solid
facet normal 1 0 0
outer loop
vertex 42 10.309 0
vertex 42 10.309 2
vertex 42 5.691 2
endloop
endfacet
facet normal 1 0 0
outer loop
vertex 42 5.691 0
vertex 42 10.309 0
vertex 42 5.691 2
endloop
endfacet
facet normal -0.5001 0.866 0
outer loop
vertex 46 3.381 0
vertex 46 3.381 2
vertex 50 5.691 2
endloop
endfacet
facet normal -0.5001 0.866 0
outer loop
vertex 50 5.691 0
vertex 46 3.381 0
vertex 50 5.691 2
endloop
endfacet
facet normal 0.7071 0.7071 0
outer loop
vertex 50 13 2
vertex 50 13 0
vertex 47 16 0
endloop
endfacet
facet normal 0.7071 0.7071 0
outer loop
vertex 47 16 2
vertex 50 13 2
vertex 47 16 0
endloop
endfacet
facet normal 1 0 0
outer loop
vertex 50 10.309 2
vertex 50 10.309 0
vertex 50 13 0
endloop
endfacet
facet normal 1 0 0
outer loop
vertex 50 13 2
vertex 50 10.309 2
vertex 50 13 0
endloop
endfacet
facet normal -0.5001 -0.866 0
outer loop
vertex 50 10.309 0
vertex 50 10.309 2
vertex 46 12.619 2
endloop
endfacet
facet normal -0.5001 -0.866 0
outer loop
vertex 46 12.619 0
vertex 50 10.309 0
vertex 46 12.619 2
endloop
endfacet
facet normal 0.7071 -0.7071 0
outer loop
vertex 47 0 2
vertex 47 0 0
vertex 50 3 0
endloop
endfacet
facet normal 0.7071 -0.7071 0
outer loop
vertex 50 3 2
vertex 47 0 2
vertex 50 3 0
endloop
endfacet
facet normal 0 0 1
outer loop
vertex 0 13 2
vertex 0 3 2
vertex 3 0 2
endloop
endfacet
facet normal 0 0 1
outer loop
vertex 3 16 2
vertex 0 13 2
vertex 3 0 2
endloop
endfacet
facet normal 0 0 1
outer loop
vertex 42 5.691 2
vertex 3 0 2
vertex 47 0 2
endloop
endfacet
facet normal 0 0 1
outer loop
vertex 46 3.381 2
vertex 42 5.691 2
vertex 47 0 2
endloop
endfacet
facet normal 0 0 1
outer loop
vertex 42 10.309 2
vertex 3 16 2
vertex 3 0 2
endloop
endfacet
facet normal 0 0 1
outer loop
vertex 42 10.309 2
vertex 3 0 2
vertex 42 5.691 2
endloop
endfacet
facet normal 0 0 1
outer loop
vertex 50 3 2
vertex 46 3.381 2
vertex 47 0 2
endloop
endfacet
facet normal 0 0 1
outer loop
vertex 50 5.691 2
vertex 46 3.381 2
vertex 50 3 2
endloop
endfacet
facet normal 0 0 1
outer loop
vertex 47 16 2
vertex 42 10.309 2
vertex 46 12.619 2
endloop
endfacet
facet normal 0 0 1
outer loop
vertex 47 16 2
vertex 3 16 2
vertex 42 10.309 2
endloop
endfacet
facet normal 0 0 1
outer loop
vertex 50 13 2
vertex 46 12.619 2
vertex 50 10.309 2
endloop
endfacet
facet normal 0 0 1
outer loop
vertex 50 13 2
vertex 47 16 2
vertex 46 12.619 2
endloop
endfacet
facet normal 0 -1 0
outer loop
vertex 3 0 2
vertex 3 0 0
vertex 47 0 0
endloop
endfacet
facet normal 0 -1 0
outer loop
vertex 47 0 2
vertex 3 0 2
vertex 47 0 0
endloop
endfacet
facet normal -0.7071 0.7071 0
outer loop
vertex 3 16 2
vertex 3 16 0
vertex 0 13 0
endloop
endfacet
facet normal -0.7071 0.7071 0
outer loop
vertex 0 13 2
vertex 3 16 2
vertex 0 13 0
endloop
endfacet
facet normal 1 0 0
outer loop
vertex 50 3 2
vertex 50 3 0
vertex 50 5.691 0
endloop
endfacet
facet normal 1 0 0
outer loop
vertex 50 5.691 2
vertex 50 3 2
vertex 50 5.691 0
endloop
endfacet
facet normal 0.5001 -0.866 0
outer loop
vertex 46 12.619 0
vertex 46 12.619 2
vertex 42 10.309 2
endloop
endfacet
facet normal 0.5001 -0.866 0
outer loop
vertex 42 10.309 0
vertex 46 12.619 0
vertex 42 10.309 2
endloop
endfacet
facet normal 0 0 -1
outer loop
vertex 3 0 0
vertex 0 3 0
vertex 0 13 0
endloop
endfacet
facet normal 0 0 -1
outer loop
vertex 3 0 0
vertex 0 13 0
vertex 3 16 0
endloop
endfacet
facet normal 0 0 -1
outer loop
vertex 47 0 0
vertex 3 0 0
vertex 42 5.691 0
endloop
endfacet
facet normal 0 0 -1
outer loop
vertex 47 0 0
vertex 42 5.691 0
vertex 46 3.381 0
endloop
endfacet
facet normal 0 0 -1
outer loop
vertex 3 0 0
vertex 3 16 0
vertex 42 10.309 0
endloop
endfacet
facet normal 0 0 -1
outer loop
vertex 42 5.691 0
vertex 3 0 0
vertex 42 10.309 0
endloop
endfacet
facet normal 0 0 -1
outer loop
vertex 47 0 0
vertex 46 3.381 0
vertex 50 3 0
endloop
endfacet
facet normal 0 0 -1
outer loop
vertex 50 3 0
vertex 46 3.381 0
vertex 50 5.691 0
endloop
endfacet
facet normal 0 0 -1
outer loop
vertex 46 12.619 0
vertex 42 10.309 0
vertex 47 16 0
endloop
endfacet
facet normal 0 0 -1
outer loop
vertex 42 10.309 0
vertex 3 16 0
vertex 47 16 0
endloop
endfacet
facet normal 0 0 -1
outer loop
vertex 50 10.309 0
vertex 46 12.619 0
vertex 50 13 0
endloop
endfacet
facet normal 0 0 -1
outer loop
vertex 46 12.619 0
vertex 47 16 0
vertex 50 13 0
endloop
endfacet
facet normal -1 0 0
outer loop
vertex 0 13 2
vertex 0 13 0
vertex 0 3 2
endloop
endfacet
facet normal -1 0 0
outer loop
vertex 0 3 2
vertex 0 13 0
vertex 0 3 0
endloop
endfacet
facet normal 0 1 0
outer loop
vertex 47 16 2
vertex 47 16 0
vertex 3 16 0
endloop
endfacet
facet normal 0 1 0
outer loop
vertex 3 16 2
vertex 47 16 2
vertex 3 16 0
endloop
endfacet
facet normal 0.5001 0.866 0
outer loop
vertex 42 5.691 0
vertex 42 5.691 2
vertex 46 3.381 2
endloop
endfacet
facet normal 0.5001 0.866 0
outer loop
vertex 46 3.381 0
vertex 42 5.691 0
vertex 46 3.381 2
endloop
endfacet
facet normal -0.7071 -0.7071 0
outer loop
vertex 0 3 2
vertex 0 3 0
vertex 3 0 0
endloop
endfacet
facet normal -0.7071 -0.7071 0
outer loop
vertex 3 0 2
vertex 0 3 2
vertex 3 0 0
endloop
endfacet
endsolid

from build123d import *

# Parameters (mm, degrees)
EXTRUDE_1_DEPTH     = 2
CUT_EXTRUDE_1_DEPTH = 10


with BuildPart() as part:
    # 스케치1 → 보스-돌출1 (new body)
    with BuildSketch(Plane.XY):
        Polygon((3, 16), (0, 13), (0, 3), (3, 0), (47, 0), (50, 3), (50, 13), (47, 16), align=None)
    extrude(amount=EXTRUDE_1_DEPTH)

    # 스케치2 → 컷-돌출1 (cut)
    with BuildSketch(Plane.XY.offset(2)):
        Polygon((46, 12.618802154), (42, 10.309401077), (42, 5.690598923), (46, 3.381197846), (50, 5.690598923), (50, 10.309401077), align=None)
    extrude(amount=-CUT_EXTRUDE_1_DEPTH, mode=Mode.SUBTRACT)


solid = part.part
